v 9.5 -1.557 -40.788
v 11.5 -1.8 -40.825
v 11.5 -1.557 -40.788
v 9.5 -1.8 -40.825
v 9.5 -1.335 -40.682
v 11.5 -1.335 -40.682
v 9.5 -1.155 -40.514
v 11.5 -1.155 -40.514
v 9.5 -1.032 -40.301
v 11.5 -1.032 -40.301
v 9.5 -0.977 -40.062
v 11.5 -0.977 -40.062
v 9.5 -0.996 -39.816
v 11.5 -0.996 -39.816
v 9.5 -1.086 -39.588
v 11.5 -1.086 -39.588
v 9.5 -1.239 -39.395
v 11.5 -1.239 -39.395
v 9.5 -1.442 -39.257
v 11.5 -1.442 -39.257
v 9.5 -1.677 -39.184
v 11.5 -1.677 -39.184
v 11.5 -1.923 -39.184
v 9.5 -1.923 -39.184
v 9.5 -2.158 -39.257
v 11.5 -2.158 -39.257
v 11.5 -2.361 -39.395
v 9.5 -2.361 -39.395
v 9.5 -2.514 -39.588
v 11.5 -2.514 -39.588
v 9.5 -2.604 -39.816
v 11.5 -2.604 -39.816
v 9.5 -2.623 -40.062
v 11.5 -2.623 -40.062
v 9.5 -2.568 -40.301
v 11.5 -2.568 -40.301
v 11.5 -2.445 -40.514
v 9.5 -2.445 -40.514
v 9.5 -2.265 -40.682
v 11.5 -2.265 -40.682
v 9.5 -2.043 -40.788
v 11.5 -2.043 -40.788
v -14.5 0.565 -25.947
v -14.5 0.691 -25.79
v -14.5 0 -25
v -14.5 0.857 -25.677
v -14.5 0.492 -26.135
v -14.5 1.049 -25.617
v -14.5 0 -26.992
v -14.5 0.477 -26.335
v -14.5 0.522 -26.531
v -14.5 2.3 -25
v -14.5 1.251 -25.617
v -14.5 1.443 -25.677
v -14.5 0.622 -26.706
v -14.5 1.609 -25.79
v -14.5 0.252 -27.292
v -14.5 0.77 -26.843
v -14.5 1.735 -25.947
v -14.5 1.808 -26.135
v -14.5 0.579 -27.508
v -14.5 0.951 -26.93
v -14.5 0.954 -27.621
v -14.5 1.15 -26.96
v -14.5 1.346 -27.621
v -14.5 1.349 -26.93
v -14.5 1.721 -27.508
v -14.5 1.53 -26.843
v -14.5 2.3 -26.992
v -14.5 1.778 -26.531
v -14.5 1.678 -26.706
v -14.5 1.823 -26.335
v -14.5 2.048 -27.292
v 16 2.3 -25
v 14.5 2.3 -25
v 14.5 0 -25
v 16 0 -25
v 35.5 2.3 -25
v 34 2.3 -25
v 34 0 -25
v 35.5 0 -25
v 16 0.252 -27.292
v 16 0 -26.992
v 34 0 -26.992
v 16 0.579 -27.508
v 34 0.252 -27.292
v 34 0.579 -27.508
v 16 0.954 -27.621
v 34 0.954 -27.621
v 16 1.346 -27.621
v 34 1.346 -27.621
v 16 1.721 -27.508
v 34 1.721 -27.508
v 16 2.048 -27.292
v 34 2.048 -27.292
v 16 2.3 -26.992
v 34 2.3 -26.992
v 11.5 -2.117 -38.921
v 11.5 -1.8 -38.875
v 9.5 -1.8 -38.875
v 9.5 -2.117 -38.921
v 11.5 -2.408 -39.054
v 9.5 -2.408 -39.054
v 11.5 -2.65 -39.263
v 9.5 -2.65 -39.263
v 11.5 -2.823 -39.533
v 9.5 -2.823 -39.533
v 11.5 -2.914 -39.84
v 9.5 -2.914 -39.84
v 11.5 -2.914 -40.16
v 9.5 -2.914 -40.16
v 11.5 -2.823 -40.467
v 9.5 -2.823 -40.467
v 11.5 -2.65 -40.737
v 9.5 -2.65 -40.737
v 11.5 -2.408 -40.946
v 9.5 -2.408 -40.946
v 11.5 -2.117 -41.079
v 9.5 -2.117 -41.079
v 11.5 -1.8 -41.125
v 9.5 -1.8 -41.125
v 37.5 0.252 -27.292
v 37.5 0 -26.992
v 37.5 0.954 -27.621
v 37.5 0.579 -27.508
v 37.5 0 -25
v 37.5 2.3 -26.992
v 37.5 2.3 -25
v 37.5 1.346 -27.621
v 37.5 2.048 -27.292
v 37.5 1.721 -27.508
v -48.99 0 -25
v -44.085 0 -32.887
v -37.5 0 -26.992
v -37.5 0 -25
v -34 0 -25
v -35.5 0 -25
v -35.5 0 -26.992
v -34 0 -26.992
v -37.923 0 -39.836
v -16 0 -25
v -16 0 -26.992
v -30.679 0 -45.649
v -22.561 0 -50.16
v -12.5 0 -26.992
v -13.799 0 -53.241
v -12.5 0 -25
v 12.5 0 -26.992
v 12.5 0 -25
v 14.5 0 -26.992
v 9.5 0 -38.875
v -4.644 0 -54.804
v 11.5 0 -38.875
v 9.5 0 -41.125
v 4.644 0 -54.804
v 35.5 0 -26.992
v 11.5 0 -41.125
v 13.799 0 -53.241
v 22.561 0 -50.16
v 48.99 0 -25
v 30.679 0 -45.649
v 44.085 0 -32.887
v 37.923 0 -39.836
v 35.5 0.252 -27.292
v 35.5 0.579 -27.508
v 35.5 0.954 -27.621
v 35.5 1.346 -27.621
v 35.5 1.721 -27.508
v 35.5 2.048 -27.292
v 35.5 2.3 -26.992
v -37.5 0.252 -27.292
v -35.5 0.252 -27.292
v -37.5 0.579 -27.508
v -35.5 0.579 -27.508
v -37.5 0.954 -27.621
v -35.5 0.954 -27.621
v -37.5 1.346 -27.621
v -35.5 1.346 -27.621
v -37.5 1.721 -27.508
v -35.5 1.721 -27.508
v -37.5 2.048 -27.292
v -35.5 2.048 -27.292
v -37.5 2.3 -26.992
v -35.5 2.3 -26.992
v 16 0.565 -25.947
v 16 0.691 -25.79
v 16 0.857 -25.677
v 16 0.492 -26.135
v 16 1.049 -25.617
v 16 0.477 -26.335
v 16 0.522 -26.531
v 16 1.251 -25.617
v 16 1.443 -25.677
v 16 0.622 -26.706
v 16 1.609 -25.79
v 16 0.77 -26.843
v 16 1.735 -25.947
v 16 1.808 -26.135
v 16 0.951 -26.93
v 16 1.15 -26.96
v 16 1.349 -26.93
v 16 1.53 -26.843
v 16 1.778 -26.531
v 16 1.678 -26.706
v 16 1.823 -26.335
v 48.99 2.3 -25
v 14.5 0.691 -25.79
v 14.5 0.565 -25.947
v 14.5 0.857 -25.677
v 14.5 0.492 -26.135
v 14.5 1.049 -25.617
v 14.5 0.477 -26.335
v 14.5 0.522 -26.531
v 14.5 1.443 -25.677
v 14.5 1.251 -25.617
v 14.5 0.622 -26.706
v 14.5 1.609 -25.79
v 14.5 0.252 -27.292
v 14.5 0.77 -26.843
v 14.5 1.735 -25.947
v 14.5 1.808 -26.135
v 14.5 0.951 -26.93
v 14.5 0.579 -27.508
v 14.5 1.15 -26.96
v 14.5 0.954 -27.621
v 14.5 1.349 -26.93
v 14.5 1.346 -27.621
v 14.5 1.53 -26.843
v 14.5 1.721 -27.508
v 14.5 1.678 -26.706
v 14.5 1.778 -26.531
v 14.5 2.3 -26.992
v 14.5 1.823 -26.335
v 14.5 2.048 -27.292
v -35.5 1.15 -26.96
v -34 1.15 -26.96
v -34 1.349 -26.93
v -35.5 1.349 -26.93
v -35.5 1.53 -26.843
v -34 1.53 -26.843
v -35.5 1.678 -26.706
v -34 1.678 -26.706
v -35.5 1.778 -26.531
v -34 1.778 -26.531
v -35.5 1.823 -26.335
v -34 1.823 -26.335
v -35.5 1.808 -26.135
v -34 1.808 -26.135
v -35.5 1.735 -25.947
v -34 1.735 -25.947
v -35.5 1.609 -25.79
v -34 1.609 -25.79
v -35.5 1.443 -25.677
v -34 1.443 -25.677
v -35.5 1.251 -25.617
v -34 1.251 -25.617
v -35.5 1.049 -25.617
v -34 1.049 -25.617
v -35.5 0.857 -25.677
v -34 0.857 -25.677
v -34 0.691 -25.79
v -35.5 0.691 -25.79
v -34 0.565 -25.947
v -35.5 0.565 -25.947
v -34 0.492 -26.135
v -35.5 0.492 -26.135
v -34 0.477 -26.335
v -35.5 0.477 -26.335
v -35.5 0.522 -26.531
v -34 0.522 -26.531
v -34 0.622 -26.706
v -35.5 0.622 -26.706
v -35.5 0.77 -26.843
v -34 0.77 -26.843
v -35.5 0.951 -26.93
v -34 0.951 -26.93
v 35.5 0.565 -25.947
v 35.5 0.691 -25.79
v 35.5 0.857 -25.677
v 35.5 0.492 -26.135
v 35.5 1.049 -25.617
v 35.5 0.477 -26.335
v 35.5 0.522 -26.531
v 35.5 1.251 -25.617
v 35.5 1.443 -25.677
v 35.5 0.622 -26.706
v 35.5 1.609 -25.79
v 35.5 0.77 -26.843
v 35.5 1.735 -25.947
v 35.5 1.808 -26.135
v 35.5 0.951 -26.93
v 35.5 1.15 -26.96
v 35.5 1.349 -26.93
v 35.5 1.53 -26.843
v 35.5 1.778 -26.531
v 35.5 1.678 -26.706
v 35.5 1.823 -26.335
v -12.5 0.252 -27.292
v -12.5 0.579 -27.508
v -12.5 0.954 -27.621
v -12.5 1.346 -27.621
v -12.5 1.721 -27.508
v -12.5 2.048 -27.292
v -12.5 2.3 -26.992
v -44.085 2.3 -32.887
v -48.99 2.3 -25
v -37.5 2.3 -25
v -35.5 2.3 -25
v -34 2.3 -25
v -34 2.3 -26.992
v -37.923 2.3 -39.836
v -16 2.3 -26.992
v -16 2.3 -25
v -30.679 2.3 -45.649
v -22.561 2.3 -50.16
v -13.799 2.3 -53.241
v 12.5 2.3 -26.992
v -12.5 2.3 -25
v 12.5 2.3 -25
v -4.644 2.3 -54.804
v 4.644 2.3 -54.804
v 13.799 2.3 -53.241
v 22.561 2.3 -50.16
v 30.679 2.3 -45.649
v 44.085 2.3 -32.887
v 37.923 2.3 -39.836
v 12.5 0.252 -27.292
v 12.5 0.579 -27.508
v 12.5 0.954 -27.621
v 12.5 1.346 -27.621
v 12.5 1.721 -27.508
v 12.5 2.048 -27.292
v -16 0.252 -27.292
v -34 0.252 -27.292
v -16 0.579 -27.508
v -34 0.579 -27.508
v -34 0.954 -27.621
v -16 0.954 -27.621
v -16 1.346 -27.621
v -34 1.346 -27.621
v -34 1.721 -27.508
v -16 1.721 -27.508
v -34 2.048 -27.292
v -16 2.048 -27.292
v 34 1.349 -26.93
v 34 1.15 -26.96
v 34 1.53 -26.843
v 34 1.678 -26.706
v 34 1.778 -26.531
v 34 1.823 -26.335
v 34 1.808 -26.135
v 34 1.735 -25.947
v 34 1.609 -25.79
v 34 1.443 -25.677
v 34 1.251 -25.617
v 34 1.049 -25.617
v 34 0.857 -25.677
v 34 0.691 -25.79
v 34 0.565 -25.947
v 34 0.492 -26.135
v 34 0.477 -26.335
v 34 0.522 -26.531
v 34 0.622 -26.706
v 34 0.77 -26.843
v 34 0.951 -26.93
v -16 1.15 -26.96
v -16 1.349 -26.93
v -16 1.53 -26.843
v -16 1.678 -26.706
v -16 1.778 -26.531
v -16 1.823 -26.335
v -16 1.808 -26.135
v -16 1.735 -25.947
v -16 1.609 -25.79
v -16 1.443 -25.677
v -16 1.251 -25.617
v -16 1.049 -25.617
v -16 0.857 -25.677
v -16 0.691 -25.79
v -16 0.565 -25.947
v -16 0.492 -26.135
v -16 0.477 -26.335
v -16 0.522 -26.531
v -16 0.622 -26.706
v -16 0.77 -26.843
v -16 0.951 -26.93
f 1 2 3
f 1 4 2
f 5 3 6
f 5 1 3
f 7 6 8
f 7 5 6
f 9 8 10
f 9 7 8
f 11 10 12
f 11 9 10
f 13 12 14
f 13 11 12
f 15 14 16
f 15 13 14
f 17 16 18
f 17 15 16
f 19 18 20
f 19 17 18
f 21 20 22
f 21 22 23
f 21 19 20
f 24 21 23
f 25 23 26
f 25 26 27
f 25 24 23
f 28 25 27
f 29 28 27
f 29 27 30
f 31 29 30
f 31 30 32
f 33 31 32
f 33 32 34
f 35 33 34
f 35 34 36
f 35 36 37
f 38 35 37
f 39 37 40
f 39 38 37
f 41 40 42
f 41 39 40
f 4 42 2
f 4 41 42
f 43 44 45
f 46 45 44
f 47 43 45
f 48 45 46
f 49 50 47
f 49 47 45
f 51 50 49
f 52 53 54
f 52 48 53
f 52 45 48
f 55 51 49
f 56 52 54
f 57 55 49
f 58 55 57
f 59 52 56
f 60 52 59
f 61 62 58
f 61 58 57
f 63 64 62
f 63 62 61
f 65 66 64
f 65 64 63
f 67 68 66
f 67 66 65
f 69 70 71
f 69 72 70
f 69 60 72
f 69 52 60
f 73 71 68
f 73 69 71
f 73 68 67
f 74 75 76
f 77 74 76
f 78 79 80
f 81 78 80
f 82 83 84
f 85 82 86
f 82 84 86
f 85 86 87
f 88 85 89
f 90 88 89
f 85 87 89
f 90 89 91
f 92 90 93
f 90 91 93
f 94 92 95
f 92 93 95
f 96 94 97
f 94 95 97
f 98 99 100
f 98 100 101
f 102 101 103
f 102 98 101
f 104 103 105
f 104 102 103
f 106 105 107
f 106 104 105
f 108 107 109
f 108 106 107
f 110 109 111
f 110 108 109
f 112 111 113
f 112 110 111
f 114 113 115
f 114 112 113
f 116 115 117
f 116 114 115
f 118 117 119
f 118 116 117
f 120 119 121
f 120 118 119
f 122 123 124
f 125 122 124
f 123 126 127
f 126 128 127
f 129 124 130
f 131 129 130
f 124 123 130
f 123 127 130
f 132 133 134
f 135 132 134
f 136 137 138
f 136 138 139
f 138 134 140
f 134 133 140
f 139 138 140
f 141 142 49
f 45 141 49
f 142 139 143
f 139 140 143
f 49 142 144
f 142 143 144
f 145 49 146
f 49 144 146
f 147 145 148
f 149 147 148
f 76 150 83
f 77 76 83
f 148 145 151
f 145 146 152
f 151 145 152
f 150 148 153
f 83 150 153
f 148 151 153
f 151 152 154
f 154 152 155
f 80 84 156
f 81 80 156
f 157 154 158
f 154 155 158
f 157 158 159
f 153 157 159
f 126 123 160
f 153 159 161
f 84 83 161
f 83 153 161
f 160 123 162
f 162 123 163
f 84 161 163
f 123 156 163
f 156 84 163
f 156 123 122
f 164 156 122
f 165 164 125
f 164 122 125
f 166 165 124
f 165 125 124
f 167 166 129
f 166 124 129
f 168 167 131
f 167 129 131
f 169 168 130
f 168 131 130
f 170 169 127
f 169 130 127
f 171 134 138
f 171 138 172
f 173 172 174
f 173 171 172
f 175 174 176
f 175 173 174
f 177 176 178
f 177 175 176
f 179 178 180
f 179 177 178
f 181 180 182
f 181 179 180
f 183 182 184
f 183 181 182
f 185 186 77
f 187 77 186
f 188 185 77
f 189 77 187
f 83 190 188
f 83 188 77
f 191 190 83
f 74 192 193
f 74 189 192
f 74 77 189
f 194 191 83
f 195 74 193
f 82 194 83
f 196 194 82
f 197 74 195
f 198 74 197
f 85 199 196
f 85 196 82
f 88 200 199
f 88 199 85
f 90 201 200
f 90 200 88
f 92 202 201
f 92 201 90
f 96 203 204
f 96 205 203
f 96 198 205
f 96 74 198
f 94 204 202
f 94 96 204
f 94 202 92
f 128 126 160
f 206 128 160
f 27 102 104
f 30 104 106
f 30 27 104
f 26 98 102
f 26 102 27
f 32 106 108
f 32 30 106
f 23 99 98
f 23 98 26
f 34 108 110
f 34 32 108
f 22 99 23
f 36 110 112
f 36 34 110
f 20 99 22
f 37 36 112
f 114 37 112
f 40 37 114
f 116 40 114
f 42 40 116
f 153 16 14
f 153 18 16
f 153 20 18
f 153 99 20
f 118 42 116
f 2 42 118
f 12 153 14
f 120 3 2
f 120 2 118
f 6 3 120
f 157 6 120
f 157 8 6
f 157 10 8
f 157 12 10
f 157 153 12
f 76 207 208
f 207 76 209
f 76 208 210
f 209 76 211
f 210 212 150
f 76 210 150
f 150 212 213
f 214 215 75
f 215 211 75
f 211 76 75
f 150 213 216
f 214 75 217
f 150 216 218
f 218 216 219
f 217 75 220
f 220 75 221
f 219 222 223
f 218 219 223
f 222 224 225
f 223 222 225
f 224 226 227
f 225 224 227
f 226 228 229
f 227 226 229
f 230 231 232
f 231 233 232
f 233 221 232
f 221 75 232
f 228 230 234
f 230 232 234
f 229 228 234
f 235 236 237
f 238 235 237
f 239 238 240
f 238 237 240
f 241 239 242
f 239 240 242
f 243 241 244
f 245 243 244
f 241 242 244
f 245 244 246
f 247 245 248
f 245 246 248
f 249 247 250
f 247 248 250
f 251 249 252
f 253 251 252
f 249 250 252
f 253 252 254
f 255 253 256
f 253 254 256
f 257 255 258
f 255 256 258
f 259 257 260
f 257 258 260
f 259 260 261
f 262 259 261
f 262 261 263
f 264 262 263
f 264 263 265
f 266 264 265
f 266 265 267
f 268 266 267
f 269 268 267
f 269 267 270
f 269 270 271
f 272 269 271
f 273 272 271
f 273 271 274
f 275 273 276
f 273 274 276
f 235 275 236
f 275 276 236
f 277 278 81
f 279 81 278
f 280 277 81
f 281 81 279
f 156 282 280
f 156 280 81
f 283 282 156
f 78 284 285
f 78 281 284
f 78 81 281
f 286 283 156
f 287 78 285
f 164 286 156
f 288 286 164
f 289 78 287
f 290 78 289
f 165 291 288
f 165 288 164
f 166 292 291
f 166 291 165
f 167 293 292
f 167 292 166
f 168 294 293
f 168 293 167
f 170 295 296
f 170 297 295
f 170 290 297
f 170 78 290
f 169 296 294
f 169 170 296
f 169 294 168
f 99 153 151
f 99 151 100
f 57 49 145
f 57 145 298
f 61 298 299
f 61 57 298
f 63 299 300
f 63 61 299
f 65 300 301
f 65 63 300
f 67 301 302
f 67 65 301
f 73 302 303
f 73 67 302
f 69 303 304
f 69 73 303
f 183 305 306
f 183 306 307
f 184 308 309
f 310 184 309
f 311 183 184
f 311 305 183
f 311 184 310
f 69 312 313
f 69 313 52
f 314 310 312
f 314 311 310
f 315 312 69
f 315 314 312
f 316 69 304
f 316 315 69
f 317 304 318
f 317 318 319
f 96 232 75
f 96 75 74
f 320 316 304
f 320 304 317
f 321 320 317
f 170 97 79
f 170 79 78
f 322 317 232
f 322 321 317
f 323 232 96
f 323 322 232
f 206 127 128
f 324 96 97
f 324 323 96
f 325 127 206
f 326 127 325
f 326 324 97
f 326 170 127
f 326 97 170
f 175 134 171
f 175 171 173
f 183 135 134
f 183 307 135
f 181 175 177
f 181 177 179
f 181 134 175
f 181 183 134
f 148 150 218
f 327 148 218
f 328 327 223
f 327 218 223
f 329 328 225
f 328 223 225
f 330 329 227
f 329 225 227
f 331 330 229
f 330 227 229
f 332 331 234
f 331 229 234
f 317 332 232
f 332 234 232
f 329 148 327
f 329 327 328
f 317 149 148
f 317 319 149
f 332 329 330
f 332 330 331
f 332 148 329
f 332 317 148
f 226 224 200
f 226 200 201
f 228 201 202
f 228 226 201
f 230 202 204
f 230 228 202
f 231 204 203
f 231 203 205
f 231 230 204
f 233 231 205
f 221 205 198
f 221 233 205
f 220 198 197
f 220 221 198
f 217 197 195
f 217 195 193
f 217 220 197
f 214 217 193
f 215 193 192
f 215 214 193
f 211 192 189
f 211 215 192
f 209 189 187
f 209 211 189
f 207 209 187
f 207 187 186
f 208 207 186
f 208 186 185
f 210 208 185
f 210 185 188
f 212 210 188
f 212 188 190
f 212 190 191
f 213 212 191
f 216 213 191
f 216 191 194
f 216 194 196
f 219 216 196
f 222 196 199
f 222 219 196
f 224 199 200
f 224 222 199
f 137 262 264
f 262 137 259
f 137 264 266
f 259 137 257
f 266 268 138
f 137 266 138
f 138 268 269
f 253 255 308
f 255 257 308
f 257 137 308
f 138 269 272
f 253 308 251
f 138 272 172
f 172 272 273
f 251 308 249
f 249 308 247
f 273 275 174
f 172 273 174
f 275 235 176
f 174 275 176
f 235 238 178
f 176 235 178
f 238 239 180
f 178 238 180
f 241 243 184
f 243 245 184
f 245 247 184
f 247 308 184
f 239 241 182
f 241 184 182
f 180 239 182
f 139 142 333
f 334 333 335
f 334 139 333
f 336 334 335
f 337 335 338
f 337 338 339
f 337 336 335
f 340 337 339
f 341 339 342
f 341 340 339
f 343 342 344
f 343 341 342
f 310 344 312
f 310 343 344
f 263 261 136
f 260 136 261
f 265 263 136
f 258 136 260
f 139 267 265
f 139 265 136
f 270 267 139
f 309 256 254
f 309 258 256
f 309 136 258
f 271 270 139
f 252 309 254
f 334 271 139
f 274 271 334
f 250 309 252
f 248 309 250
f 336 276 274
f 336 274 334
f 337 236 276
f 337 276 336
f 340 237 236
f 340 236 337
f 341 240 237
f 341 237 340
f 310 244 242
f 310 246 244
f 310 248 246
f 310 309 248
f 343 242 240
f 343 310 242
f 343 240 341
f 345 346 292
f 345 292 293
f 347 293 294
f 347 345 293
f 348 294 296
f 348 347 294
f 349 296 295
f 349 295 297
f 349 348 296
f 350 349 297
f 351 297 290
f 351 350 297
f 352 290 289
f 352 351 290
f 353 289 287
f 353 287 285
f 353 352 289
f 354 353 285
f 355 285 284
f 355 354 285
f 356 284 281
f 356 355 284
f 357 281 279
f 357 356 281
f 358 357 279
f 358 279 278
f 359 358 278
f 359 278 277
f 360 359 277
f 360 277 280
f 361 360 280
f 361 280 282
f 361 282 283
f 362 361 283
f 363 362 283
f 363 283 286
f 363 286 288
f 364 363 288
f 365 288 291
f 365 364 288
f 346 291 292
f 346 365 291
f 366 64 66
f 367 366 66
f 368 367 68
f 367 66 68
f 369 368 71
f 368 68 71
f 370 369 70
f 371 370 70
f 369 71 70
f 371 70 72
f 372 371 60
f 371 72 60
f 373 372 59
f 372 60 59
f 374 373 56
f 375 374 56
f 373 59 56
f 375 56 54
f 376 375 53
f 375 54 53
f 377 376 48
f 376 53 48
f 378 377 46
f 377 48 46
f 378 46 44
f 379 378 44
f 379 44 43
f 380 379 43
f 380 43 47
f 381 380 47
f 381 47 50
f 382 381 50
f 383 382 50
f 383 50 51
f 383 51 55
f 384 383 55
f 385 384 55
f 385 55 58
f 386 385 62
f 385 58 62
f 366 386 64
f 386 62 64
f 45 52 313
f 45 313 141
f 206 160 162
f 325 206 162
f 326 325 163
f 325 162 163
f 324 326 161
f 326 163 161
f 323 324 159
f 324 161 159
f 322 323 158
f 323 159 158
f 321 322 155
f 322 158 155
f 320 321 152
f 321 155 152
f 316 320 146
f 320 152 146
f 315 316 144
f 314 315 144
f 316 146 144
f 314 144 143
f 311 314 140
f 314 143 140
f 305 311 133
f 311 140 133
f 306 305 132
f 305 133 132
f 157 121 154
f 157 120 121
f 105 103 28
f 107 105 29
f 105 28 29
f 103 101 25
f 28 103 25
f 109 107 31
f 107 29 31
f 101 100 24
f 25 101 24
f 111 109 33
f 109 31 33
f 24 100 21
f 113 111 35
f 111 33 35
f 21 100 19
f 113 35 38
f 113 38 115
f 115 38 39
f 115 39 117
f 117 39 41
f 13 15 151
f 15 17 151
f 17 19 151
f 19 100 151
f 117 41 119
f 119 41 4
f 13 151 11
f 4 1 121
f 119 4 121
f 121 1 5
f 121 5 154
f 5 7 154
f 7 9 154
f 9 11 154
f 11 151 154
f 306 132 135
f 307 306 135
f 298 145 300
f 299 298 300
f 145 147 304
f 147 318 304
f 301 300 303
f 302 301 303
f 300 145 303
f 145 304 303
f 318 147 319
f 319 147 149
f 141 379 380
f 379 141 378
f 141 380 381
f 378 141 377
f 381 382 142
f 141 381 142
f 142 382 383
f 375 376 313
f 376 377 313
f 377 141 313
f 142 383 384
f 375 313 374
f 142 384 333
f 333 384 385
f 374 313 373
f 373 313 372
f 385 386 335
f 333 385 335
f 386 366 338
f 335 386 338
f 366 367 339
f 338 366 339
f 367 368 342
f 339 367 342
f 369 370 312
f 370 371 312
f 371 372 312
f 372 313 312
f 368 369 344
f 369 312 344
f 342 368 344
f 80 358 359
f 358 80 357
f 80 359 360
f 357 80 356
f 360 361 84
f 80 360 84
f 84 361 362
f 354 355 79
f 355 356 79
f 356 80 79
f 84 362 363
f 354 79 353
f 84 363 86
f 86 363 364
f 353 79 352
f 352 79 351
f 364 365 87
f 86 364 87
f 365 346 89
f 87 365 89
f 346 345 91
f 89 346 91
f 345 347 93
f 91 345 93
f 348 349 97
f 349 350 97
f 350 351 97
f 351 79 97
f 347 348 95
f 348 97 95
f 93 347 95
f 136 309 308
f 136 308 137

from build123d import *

# Parameters (mm, degrees)
BOSS_EXTRUDE1_DEPTH = 2.3
CUT_EXTRUDE1_START  = 25
CUT_EXTRUDE1_DEPTH  = 12.5
BOSS_EXTRUDE2_START = 35.5
SKETCH2_8_R         = 0.675
BOSS_EXTRUDE2_DEPTH = 1.5
BOSS_EXTRUDE5_START = 16
SKETCH2_11_R        = 0.675
BOSS_EXTRUDE5_DEPTH = 1.5
BOSS_EXTRUDE3_START = 10.5
SKETCH4_R           = 0.825
BOSS_EXTRUDE3_DEPTH = 1


with BuildPart() as part:
    # Sketch1 → Boss-Extrude1 (new body)
    with BuildSketch(Plane(origin=(0, 0, 0), x_dir=(1, 0, 0), z_dir=(0, 1, 0))):
        with BuildLine():
            ThreePointArc((48.989794856, 25), (0, 55), (-48.989794856, 25))
            Line((-48.989794856, 25), (48.989794856, 25))
        make_face()
    extrude(amount=BOSS_EXTRUDE1_DEPTH)

    # Sketch2 → Cut-Extrude1 (cut, symmetric)
    with BuildSketch(Plane(origin=(0, 0, 0), x_dir=(0, 0, -1), z_dir=(1, 0, 0)).offset(CUT_EXTRUDE1_START)):
        with BuildLine():
            Line((25, 2.3), (25, 0))
            Line((25, 0), (26.991919376, 0))
            ThreePointArc((26.991919376, 0), (27.634812595, 1.15), (26.991919376, 2.3))
            Line((26.991919376, 2.3), (25, 2.3))
        make_face()
    cut_extrude1 = extrude(amount=CUT_EXTRUDE1_DEPTH, both=True, mode=Mode.SUBTRACT)

    # Sketch2<8> → Boss-Extrude2 (add)
    with BuildSketch(Plane(origin=(0, 0, 0), x_dir=(0, 0, -1), z_dir=(1, 0, 0)).offset(BOSS_EXTRUDE2_START)):
        with BuildLine():
            Line((25, 2.3), (25, 0))
            Line((25, 0), (26.991919376, 0))
            ThreePointArc((26.991919376, 0), (27.634812595, 1.15), (26.991919376, 2.3))
            Line((26.991919376, 2.3), (25, 2.3))
        make_face()
        with Locations((26.284812595, 1.15)):
            Circle(SKETCH2_8_R, mode=Mode.SUBTRACT)
    boss_extrude2 = extrude(amount=-BOSS_EXTRUDE2_DEPTH)

    # Sketch2<11> → Boss-Extrude5 (add)
    with BuildSketch(Plane(origin=(0, 0, 0), x_dir=(0, 0, -1), z_dir=(1, 0, 0)).offset(BOSS_EXTRUDE5_START)):
        with BuildLine():
            Line((25, 2.3), (25, 0))
            Line((25, 0), (26.991919376, 0))
            ThreePointArc((26.991919376, 0), (27.634812595, 1.15), (26.991919376, 2.3))
            Line((26.991919376, 2.3), (25, 2.3))
        make_face()
        with Locations((26.284812595, 1.15)):
            Circle(SKETCH2_11_R, mode=Mode.SUBTRACT)
    boss_extrude5 = extrude(amount=-BOSS_EXTRUDE5_DEPTH)

    # Mirror1: Cut-Extrude1, Boss-Extrude2, Boss-Extrude5 across plane
    add(cut_extrude1.mirror(Plane(origin=(0, 0, 0), x_dir=(0, 0, 1), z_dir=(1, 0, 0))), mode=Mode.SUBTRACT)
    add(boss_extrude2.mirror(Plane(origin=(0, 0, 0), x_dir=(0, 0, 1), z_dir=(1, 0, 0))))
    add(boss_extrude5.mirror(Plane(origin=(0, 0, 0), x_dir=(0, 0, 1), z_dir=(1, 0, 0))))

    # Sketch4 → Boss-Extrude3 (add, symmetric)
    with BuildSketch(Plane(origin=(0, 0, 0), x_dir=(0, 0, -1), z_dir=(1, 0, 0)).offset(BOSS_EXTRUDE3_START)):
        with BuildLine():
            Line((41.125, 0), (38.875, 0))
            Line((38.875, 0), (38.875, -1.8))
            ThreePointArc((38.875, -1.8), (40, -2.925), (41.125, -1.8))
            Line((41.125, -1.8), (41.125, 0))
        make_face()
        with Locations((40, -1.8)):
            Circle(SKETCH4_R, mode=Mode.SUBTRACT)
    extrude(amount=BOSS_EXTRUDE3_DEPTH, both=True)


solid = part.part
